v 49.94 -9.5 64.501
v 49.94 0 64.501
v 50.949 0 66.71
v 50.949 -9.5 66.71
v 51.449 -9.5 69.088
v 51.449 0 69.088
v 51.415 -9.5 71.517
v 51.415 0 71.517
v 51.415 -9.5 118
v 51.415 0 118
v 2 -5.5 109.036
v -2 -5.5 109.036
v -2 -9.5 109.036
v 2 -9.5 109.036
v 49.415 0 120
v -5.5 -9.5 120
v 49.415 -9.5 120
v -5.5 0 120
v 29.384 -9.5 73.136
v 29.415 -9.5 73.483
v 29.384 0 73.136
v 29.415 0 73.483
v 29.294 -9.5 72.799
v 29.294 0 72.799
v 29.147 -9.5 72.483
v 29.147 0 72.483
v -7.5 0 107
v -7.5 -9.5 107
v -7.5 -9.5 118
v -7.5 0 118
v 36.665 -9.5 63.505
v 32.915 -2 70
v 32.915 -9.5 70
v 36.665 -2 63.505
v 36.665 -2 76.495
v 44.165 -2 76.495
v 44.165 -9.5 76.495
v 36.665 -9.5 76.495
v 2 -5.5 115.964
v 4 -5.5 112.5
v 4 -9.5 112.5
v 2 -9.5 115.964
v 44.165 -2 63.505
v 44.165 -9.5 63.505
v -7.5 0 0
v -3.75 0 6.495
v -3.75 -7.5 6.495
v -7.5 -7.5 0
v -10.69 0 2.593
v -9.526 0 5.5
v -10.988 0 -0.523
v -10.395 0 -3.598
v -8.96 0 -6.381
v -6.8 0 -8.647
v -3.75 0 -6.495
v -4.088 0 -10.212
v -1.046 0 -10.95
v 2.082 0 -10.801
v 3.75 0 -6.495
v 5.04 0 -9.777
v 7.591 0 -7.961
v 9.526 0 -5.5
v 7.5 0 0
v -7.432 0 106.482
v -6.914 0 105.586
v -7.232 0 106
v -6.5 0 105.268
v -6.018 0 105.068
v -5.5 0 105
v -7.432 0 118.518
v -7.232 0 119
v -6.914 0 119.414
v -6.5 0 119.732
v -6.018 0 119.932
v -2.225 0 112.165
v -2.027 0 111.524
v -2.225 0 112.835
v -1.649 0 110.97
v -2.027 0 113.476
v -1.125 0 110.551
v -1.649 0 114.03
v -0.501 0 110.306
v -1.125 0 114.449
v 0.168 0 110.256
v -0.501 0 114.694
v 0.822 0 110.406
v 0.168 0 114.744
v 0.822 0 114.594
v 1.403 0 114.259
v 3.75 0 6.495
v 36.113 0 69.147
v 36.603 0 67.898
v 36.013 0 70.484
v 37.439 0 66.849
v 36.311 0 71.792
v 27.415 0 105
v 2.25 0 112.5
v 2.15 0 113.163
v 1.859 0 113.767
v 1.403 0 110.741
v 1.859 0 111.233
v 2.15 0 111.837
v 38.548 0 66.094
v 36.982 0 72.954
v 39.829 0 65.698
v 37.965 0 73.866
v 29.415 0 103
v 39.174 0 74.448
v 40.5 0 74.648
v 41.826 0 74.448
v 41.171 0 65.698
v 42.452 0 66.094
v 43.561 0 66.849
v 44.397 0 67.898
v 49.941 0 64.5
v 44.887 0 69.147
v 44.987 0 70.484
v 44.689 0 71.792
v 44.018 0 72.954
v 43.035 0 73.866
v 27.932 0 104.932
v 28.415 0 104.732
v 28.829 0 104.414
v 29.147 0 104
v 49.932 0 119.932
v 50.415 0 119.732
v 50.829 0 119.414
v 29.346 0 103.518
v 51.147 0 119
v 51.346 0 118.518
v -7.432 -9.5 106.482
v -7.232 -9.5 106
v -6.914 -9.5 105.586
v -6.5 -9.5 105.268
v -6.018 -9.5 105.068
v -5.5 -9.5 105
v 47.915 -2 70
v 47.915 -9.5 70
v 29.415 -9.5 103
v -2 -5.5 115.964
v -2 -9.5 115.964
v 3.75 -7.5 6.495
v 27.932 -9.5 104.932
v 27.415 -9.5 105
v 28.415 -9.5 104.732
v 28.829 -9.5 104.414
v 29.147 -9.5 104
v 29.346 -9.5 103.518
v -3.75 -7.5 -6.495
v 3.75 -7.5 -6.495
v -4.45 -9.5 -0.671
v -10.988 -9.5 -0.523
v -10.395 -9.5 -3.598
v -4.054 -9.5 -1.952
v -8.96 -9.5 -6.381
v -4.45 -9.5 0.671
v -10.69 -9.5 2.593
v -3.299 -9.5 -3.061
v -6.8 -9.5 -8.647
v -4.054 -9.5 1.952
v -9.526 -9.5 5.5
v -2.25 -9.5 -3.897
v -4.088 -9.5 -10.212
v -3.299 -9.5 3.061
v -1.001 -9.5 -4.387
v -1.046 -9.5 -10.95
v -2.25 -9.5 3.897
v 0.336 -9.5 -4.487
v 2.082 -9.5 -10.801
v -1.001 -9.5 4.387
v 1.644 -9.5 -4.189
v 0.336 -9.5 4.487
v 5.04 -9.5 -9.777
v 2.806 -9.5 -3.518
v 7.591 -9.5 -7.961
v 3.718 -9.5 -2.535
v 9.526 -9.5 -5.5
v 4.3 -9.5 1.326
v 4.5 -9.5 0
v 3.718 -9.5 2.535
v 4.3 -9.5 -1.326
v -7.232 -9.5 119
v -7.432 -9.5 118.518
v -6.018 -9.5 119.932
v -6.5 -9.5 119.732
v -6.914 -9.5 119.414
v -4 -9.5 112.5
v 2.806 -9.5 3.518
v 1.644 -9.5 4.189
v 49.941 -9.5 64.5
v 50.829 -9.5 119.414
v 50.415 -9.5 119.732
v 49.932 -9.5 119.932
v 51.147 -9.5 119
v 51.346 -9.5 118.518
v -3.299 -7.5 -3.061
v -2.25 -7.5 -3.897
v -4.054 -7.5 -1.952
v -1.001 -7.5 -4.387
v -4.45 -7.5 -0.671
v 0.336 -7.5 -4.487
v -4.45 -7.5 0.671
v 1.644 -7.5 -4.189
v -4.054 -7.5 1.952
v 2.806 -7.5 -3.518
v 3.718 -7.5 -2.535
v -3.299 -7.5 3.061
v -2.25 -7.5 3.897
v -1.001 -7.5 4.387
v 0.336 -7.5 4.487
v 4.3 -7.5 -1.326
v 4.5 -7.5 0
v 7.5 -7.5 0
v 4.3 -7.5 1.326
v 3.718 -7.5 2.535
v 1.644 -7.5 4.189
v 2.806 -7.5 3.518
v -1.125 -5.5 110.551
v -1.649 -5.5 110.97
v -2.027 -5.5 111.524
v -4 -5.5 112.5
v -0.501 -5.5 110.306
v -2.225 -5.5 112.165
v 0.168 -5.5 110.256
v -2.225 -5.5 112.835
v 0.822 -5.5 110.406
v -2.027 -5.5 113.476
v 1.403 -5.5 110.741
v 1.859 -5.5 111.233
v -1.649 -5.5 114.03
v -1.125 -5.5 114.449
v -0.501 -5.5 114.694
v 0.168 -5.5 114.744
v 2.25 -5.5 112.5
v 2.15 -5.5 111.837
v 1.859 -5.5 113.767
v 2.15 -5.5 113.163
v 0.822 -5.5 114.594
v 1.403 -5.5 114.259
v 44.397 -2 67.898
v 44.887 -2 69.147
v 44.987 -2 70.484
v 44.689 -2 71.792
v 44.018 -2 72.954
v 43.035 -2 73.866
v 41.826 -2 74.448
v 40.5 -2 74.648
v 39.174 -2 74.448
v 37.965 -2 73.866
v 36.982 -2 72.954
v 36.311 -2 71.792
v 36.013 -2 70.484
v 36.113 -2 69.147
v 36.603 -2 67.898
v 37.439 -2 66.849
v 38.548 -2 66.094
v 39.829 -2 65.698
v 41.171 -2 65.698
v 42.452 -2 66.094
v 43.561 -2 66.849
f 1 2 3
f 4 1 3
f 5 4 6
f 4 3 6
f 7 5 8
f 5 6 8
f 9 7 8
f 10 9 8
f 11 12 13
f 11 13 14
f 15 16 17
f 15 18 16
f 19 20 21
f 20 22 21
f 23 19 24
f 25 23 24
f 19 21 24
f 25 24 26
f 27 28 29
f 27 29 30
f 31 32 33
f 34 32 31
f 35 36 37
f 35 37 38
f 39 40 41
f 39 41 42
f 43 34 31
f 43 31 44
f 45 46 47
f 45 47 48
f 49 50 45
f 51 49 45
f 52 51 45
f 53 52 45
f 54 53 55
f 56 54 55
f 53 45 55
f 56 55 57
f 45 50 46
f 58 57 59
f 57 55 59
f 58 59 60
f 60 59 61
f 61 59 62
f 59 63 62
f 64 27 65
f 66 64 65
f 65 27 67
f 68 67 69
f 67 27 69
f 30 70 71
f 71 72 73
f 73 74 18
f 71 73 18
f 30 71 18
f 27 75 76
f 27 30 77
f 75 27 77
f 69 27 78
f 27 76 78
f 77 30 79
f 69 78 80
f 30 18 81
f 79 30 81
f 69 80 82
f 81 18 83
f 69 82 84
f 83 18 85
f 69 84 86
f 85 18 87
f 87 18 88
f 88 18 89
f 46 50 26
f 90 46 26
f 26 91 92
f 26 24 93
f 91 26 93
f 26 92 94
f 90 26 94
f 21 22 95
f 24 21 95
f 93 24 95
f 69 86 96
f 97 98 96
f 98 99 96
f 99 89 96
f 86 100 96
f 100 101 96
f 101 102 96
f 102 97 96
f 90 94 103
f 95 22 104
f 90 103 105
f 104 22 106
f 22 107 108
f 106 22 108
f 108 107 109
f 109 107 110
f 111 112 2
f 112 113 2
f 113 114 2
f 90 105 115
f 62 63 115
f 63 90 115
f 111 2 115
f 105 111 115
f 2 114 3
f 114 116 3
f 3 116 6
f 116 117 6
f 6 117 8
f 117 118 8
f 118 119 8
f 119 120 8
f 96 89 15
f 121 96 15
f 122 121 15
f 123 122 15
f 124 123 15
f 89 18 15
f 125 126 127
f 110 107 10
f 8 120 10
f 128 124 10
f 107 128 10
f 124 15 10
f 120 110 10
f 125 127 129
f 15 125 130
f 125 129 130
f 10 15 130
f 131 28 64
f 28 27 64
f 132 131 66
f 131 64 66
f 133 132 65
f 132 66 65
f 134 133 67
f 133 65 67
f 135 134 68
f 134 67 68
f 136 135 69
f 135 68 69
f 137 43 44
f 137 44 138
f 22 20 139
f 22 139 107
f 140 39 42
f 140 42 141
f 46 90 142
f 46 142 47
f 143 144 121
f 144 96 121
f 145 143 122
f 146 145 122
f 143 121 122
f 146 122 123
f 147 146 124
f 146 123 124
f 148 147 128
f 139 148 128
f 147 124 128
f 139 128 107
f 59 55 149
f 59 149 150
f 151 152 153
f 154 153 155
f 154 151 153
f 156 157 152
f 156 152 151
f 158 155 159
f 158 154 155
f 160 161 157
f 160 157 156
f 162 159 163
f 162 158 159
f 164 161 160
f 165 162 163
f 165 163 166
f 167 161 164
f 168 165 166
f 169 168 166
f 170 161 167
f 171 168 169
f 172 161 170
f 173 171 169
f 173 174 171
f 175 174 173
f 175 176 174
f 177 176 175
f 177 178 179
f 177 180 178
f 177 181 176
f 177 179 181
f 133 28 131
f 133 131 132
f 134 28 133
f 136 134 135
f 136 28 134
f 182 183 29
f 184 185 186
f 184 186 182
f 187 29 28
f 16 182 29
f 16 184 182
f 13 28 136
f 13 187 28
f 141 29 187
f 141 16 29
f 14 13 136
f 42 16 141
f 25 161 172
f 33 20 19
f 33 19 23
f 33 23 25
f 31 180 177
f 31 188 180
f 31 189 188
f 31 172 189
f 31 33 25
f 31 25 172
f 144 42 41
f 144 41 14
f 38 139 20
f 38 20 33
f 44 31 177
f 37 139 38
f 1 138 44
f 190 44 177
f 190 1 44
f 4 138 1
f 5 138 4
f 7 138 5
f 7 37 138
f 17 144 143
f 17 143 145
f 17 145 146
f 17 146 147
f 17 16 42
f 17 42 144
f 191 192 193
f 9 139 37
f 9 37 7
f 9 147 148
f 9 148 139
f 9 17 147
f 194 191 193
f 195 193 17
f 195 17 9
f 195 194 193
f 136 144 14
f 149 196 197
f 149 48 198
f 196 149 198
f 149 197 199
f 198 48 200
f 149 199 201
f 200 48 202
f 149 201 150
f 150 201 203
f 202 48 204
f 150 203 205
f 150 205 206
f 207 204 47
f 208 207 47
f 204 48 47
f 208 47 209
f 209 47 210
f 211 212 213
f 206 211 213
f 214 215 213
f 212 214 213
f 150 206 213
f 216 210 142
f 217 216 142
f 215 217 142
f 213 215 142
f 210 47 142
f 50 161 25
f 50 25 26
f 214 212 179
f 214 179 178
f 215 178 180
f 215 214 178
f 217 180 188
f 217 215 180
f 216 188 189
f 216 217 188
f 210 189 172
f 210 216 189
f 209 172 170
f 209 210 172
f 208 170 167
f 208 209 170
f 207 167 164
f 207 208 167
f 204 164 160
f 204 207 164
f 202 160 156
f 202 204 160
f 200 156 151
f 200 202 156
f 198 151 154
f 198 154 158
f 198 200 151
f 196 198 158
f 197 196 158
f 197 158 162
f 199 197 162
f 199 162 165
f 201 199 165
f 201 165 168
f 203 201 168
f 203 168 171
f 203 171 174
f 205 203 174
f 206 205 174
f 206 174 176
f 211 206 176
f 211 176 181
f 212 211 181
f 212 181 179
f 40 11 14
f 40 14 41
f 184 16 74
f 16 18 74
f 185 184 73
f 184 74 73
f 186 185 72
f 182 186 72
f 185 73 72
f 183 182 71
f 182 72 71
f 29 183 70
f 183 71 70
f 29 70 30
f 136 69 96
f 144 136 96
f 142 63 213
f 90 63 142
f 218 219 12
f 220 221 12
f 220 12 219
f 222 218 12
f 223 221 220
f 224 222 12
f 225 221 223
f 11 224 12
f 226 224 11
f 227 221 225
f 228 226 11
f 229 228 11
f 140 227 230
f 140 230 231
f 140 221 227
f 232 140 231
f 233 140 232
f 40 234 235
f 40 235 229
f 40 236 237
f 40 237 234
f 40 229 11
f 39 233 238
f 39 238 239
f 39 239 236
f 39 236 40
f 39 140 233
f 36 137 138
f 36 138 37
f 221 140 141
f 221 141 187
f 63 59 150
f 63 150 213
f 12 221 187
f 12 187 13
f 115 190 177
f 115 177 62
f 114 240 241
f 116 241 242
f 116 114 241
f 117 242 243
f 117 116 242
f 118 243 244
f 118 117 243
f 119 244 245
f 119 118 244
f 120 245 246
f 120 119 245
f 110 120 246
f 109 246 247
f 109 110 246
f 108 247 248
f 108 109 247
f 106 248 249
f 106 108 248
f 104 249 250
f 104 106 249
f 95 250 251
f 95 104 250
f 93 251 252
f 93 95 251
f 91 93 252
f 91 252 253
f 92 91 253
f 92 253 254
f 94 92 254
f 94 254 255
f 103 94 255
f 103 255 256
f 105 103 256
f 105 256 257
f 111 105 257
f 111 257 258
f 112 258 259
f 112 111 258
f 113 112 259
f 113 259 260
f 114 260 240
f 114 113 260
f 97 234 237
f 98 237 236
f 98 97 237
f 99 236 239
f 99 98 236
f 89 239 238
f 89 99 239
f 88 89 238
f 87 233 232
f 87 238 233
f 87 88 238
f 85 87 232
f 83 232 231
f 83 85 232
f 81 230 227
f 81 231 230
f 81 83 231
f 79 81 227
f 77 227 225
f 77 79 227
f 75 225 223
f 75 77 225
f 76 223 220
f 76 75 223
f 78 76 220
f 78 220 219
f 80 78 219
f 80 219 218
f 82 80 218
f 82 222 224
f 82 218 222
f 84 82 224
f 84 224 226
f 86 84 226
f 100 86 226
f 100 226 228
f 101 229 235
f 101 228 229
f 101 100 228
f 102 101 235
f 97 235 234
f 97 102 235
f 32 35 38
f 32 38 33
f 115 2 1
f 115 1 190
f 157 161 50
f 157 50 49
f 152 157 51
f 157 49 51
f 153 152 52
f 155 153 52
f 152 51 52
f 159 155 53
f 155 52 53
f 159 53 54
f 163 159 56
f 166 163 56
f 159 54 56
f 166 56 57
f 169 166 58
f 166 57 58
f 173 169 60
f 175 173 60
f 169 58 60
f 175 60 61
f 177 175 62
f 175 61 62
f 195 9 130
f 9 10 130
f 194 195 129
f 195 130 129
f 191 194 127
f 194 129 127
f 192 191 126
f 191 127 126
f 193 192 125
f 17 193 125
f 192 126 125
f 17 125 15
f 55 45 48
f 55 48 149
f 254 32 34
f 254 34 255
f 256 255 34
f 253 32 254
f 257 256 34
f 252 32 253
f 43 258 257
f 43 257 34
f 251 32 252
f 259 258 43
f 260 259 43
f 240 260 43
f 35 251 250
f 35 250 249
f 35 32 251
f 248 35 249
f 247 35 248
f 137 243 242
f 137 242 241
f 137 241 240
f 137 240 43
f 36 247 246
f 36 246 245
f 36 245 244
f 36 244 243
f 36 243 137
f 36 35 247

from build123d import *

# Parameters (mm, degrees)
PAD002_DEPTH              = 7.5
BODY002_PLACEMENT_ANGLE   = 90
CYLINDER015_R             = 4.5
CYLINDER015_DEPTH         = 9.5
COMPOUND_PLACEMENT_ANGLE  = 30
CYLINDER014_R             = 4.5
CYLINDER014_DEPTH         = 9.5
PAD001_DEPTH              = 4
BODY001_PLACEMENT_ANGLE   = 90
PAD_DEPTH                 = 7.5
BODY_PLACEMENT_ANGLE      = 90
CYLINDER016_R             = 2.25
CYLINDER016_DEPTH         = 9.5
BOX002_W                  = 58.914519
BOX002_H                  = 9.5
BOX002_DEPTH              = 15
BOX_W                     = 22
BOX_H                     = 9.5
BOX_DEPTH                 = 80.829038
CYLINDER013_R             = 11
CYLINDER013_DEPTH         = 9.5
CYLINDER012_R             = 11
CYLINDER012_DEPTH         = 9.5
FUSION005_PLACEMENT_ANGLE = 30
BOX001_W                  = 22
BOX001_H                  = 9.5
BOX001_DEPTH              = 50
FILLET_R                  = 2
FILLET001_R               = 2
FILLET002_R               = 2


with BuildPart() as m8press001:
    # Sketch002 → Pad002 (new body)
    with BuildSketch(Plane.XY):
        Polygon((7.5, 0), (3.75, 6.495191), (-3.75, 6.495191), (-7.5, 0), (-3.75, -6.495191), (3.75, -6.495191), align=None)
    extrude(amount=PAD002_DEPTH)


with BuildPart() as m8press001_1:
    # Body002 placement: moved
    add(m8press001.part.moved(Location((40.414519, -2, 70))).rotate(Axis((40.414519, -2, 70), (1, 0, 0)), BODY002_PLACEMENT_ANGLE))


with BuildPart() as compound:
    # Cylinder015 → Cylinder015 (new body)
    with BuildSketch(Plane(origin=(0, 0, 81), x_dir=(1, 0, 0), z_dir=(0, -1, 0))):
        Circle(CYLINDER015_R)
    extrude(amount=CYLINDER015_DEPTH)


with BuildPart() as compound_1:
    # Compound placement: moved
    add(compound.part.rotate(Axis((0, 0, 0), (0, 1, 0)), COMPOUND_PLACEMENT_ANGLE))


with BuildPart() as cylinder014:
    # Cylinder014 → Cylinder014 (new body)
    with BuildSketch(Plane.XZ):
        Circle(CYLINDER014_R)
    extrude(amount=CYLINDER014_DEPTH)


with BuildPart() as m4press:
    # Sketch001 → Pad001 (new body)
    with BuildSketch(Plane.XY):
        Polygon((4, 0), (2, 3.464102), (-2, 3.464102), (-4, 0), (-2, -3.464102), (2, -3.464102), align=None)
    extrude(amount=PAD001_DEPTH)


with BuildPart() as m4press_1:
    # Body001 placement: moved
    add(m4press.part.moved(Location((0, -5.5, 112.5))).rotate(Axis((0, -5.5, 112.5), (1, 0, 0)), BODY001_PLACEMENT_ANGLE))


with BuildPart() as m8press:
    # Sketch → Pad (new body)
    with BuildSketch(Plane.XY):
        Polygon((7.5, 0), (3.75, 6.495191), (-3.75, 6.495191), (-7.5, 0), (-3.75, -6.495191), (3.75, -6.495191), align=None)
    extrude(amount=PAD_DEPTH)


with BuildPart() as m8press_1:
    # Body placement: moved
    add(m8press.part.rotate(Axis((0, 0, 0), (1, 0, 0)), BODY_PLACEMENT_ANGLE))


with BuildPart() as fusion006:
    # Cylinder016 → Cylinder016 (new body)
    with BuildSketch(Plane(origin=(0, 0, 112.5), x_dir=(1, 0, 0), z_dir=(0, -1, 0))):
        Circle(CYLINDER016_R)
    extrude(amount=CYLINDER016_DEPTH)

    # Fusion006: union M8Press001, Compound, Cylinder014, M4Press, M8Press
    add(m8press001_1.part)
    add(compound_1.part)
    add(cylinder014.part)
    add(m4press_1.part)
    add(m8press_1.part)


with BuildPart() as cube002:
    # Box002 → Box002 (new body)
    with BuildSketch(Plane(origin=(-7.5, -9.5, 105), x_dir=(1, 0, 0), z_dir=(0, 0, 1))):
        with Locations((29.457259, 4.75)):
            Rectangle(BOX002_W, BOX002_H)
    extrude(amount=BOX002_DEPTH)


with BuildPart() as cube:
    # Box → Box (new body)
    with BuildSketch(Plane(origin=(-11, -9.5, 0), x_dir=(1, 0, 0), z_dir=(0, 0, 1))):
        with Locations((11, 4.75)):
            Rectangle(BOX_W, BOX_H)
    extrude(amount=BOX_DEPTH)


with BuildPart() as cylinder013:
    # Cylinder013 → Cylinder013 (new body)
    with BuildSketch(Plane(origin=(0, 0, 81), x_dir=(1, 0, 0), z_dir=(0, -1, 0))):
        Circle(CYLINDER013_R)
    extrude(amount=CYLINDER013_DEPTH)


with BuildPart() as fusion005:
    # Cylinder012 → Cylinder012 (new body)
    with BuildSketch(Plane.XZ):
        Circle(CYLINDER012_R)
    extrude(amount=CYLINDER012_DEPTH)

    # Fusion005: union Cube, Cylinder013
    add(cube.part)
    add(cylinder013.part)


with BuildPart() as fusion005_1:
    # Fusion005 placement: moved
    add(fusion005.part.rotate(Axis((0, 0, 0), (0, 1, 0)), FUSION005_PLACEMENT_ANGLE))


with BuildPart() as fillet002:
    # Box001 → Box001 (new body)
    with BuildSketch(Plane(origin=(29.414519, -9.5, 70), x_dir=(1, 0, 0), z_dir=(0, 0, 1))):
        with Locations((11, 4.75)):
            Rectangle(BOX001_W, BOX001_H)
    extrude(amount=BOX001_DEPTH)

    # Fusion007: union Cube002, Fusion005
    add(cube002.part)
    add(fusion005_1.part)

    # Cut005: cut Fusion006
    add(fusion006.part, mode=Mode.SUBTRACT)

    # Fillet
    fillet_edges = [fillet002.edges().sort_by_distance(p)[0] for p in [
        (51.414519, -4.75, 120),
        (-7.5, -4.75, 105),
        (-7.5, -4.75, 120),
    ]]
    fillet(fillet_edges, radius=FILLET_R)

    # Fillet001
    fillet001_edges = [fillet002.edges().sort_by_distance(p)[0] for p in [
        (29.414519, -4.75, 105),
    ]]
    fillet(fillet001_edges, radius=FILLET001_R)

    # Fillet002
    fillet002_edges = [fillet002.edges().sort_by_distance(p)[0] for p in [
        (29.414519, -4.75, 72.947441),
    ]]
    fillet(fillet002_edges, radius=FILLET002_R)


solid = fillet002.part
